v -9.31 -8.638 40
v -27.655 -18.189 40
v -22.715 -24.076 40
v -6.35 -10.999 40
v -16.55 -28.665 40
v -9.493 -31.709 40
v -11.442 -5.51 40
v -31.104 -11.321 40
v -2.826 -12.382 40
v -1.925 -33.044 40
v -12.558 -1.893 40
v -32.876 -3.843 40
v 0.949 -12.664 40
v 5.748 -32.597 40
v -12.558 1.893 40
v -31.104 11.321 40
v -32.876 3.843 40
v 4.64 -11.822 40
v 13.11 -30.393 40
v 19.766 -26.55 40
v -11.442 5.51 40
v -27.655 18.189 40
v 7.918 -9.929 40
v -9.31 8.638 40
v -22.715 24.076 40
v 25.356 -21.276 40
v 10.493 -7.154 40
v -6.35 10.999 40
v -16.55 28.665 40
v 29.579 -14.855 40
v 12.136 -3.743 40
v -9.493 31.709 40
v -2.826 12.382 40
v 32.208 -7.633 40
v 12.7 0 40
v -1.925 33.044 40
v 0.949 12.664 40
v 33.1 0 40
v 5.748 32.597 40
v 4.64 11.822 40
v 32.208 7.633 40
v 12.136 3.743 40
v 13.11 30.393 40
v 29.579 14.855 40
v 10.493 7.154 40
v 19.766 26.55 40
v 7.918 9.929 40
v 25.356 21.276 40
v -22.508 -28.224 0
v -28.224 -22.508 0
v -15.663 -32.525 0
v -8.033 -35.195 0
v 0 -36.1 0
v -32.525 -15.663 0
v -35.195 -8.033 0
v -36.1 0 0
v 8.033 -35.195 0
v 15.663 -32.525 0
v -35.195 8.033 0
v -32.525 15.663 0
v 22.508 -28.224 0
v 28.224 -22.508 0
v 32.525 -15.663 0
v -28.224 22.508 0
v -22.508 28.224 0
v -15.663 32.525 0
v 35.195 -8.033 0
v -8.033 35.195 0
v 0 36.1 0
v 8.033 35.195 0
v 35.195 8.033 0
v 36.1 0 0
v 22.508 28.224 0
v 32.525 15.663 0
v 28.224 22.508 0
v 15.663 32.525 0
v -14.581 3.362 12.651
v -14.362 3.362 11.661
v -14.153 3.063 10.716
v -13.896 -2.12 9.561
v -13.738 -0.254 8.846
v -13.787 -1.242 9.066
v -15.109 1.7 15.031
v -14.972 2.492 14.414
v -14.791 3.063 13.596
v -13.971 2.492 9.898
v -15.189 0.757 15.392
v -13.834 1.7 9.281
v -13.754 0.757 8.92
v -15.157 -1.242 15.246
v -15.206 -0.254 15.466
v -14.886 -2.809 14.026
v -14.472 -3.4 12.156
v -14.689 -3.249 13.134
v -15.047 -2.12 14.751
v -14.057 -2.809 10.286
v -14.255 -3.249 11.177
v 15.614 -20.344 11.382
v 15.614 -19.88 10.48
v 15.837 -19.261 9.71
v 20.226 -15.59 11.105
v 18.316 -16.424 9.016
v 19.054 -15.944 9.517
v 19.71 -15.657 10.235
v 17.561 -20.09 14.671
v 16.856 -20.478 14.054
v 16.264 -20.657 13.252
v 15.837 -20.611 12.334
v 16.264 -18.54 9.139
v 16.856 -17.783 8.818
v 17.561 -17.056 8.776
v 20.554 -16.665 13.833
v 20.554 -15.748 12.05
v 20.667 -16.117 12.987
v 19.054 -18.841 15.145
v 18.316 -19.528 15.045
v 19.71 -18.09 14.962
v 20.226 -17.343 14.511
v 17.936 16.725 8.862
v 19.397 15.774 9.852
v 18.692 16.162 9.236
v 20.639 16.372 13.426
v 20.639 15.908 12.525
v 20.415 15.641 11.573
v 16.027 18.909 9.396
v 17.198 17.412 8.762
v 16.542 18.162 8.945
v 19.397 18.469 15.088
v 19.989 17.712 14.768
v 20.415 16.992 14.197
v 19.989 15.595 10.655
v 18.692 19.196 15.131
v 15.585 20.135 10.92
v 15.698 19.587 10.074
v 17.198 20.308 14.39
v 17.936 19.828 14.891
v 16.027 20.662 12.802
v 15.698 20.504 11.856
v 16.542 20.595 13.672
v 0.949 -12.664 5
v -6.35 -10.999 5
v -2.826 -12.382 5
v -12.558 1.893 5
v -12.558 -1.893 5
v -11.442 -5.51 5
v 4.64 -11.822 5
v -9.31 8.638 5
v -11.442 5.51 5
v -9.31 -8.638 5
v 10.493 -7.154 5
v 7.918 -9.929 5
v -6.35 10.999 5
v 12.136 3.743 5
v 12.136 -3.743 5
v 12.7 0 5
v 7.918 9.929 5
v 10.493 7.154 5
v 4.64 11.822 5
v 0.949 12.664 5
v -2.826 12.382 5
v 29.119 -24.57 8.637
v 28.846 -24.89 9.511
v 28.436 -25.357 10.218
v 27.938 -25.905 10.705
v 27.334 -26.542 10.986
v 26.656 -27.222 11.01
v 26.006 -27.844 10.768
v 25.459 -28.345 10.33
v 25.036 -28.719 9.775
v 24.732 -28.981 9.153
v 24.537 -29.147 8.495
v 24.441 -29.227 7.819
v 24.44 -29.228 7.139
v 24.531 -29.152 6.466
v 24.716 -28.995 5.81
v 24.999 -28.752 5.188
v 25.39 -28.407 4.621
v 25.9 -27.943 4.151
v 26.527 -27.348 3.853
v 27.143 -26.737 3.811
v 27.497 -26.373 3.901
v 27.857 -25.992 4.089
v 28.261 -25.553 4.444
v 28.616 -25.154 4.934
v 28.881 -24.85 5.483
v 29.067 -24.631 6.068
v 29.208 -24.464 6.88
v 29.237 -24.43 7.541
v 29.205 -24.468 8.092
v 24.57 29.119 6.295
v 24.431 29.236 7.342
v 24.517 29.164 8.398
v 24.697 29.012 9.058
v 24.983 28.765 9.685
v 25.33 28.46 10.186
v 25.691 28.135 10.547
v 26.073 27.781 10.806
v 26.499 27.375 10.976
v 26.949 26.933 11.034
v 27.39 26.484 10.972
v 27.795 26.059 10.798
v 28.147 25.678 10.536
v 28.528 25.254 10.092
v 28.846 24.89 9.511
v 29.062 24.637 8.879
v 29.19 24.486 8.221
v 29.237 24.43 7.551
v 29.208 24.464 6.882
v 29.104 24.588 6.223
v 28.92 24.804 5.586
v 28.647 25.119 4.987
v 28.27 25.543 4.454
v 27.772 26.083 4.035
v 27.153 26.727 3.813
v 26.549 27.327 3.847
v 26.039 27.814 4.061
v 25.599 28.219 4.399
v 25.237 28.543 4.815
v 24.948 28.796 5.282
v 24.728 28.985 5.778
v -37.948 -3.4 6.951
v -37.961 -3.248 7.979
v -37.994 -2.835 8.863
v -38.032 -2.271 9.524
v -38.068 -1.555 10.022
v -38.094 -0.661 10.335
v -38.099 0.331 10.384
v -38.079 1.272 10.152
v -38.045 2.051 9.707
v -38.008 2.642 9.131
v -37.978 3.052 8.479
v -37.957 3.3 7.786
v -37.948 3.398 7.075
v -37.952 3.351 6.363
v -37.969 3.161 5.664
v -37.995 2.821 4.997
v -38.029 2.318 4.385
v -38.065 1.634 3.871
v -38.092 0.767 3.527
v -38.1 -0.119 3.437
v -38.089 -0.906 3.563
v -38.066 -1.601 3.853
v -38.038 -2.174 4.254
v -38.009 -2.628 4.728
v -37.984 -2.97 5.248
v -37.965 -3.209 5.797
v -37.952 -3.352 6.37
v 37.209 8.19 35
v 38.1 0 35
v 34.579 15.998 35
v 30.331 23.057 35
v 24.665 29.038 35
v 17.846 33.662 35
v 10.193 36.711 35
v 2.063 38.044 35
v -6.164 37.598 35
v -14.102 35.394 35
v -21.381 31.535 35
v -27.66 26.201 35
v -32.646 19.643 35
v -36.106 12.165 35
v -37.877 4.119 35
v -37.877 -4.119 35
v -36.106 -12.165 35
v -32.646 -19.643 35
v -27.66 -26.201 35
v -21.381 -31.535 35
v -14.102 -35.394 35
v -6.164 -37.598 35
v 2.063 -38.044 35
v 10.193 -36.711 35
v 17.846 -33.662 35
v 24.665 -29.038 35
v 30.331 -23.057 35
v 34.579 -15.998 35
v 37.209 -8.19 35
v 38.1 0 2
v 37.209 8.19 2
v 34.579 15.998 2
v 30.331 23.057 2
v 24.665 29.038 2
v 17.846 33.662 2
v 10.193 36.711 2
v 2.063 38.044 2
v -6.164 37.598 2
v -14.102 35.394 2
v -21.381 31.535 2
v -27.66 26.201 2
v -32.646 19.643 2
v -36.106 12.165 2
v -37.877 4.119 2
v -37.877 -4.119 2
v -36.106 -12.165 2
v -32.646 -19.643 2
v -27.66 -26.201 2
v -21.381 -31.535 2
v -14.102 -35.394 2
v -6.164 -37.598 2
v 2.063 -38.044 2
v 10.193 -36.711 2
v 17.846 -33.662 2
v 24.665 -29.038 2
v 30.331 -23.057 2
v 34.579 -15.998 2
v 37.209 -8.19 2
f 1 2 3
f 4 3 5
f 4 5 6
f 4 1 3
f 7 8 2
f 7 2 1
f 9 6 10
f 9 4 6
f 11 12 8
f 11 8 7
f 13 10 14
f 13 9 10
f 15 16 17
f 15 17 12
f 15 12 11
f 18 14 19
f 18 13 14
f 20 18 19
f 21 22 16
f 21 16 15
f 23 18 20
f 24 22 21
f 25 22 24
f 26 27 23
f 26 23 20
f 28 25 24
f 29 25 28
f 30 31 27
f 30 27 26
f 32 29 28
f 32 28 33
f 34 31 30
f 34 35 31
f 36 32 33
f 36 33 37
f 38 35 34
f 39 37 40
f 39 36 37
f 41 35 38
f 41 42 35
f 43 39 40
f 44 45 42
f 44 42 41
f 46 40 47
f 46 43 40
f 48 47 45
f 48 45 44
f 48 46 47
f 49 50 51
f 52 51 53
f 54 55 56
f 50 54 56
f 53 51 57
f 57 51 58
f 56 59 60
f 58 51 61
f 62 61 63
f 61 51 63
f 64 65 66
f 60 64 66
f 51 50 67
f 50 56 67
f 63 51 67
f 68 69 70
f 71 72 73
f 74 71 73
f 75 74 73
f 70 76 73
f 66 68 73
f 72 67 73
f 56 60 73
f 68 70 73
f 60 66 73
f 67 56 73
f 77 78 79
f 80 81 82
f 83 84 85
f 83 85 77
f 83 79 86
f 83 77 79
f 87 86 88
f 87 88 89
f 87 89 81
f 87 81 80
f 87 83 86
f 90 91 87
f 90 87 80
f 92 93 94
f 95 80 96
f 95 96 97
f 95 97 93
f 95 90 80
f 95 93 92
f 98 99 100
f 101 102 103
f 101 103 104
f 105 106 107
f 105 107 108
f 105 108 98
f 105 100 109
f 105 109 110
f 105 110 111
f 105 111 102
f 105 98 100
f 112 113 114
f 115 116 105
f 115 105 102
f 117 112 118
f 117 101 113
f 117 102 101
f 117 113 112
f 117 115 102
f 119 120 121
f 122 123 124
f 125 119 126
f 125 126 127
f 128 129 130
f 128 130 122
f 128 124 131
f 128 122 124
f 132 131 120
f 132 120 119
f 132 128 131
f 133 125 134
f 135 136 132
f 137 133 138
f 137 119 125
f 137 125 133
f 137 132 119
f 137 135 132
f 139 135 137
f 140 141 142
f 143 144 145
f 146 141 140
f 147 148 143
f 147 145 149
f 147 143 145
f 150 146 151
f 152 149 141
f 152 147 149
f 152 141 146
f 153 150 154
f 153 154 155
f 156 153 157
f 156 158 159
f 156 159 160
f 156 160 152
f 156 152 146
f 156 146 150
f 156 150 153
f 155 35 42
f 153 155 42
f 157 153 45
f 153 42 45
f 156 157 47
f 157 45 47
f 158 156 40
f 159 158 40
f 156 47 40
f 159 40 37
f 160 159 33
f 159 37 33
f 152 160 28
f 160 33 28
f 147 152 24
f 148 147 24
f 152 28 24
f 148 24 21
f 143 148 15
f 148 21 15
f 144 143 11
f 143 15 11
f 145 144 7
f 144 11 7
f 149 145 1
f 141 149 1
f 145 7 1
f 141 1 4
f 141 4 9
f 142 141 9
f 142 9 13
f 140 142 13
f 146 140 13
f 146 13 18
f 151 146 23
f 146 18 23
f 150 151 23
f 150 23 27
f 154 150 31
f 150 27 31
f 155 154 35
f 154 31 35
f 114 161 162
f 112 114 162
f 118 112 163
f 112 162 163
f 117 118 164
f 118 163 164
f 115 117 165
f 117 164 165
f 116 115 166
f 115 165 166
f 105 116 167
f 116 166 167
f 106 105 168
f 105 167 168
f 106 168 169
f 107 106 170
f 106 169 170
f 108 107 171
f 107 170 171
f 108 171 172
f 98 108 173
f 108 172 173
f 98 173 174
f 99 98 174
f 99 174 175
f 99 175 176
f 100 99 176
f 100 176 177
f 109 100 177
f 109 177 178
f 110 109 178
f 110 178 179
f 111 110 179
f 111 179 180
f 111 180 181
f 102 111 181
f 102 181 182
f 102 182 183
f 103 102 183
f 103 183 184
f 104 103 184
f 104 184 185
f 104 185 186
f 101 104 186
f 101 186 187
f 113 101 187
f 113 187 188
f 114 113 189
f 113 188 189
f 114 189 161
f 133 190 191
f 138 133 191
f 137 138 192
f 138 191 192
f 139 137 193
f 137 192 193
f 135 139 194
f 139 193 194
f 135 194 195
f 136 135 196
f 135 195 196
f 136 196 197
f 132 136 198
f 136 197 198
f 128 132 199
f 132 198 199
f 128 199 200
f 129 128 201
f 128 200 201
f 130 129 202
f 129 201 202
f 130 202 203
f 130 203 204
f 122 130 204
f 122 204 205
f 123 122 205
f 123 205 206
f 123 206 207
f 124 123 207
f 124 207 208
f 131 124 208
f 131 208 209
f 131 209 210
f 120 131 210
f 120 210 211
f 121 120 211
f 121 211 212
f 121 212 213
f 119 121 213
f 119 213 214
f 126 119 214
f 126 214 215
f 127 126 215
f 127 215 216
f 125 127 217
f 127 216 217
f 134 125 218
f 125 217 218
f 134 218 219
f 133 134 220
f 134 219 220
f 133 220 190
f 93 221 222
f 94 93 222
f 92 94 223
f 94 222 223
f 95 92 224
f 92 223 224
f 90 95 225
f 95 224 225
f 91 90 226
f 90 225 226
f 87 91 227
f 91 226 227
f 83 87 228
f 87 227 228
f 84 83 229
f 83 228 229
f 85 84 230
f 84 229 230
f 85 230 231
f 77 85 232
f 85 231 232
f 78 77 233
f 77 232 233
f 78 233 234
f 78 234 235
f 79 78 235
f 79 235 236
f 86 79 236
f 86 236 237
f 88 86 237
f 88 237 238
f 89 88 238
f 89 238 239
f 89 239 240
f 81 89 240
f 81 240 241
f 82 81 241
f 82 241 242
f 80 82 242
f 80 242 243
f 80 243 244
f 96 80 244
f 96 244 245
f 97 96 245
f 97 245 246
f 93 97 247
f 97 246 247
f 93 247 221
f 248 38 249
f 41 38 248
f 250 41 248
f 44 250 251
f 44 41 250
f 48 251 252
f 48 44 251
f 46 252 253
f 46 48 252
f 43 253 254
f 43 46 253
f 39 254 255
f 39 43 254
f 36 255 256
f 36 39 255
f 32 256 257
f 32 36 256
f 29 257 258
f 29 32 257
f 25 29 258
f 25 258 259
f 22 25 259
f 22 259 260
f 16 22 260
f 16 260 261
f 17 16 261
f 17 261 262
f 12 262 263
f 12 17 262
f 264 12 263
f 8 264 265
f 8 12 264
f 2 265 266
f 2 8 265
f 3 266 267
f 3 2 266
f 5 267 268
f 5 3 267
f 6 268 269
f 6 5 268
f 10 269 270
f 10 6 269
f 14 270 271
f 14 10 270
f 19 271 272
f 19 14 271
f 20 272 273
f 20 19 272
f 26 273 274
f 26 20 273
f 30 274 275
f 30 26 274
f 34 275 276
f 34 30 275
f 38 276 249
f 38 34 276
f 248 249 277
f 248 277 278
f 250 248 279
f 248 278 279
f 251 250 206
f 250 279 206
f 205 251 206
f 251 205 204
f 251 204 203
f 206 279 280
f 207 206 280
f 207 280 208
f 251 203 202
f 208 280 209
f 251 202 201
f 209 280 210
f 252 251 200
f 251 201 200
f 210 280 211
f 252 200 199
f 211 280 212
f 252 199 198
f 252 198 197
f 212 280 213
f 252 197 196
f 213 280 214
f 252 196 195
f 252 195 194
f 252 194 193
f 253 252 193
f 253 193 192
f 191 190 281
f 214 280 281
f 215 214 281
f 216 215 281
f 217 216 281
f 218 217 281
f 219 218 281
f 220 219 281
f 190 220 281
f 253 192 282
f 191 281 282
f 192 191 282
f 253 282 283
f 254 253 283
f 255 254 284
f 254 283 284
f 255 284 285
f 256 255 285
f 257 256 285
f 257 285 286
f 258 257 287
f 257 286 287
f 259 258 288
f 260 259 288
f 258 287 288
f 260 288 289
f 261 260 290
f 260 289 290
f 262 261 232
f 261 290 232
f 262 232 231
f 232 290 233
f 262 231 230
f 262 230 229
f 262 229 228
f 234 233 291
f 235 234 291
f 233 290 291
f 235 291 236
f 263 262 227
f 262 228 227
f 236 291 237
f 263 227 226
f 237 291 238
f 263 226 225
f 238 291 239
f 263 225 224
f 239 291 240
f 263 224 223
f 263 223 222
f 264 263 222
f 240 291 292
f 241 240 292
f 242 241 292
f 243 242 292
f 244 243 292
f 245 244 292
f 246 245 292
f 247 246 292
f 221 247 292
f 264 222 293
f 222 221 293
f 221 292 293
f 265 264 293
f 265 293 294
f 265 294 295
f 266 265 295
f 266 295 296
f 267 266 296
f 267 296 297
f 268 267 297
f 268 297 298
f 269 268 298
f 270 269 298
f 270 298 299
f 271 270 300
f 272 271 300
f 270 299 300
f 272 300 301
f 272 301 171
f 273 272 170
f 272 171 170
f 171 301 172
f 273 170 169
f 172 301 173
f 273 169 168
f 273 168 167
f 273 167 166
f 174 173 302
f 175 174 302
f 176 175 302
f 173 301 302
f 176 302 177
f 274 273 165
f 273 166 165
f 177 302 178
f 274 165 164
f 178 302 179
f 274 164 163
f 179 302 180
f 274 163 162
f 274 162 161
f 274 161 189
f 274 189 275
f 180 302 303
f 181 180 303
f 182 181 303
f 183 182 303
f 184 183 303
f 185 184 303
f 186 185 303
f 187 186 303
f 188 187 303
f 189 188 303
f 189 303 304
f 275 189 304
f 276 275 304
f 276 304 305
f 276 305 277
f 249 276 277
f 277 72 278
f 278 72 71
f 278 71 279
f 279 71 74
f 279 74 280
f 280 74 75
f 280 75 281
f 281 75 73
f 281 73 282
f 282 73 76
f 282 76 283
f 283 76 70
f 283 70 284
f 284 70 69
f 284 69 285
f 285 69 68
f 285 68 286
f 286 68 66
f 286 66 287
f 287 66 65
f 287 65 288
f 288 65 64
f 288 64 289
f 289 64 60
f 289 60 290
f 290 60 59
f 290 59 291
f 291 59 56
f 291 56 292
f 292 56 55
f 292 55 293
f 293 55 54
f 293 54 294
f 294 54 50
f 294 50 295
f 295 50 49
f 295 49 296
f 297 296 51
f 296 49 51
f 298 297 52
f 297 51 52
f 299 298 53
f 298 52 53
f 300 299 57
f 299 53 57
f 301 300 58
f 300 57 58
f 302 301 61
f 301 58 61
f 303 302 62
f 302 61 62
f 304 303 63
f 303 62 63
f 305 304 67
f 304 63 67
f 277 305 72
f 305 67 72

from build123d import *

# Parameters (mm, degrees)
F0_R      = 38.1
F1_DEPTH  = 40
F2_R      = 12.7
F3_DEPTH  = 35
F4_SIZE   = 5
F11_R     = 3.4
F12_DEPTH = 50
F15_SIZE  = 2
F16_R     = 3.4
F17_DEPTH = 50
F18_R     = 3.4
F19_DEPTH = 50


with BuildPart() as f1:
    # F0 (on Top) → F1 (new body)
    with BuildSketch(Plane.XY):
        Circle(F0_R)
    extrude(amount=F1_DEPTH)

    # F2 (on face) → F3 (cut)
    with BuildSketch(Plane.XY.offset(40)):
        Circle(F2_R)
    extrude(amount=-F3_DEPTH, mode=Mode.SUBTRACT)

    # F4
    f4_edges = [f1.edges().sort_by_distance(p)[0] for p in [
        (-38.1, 0, 40),
    ]]
    chamfer(f4_edges, length=F4_SIZE)

    # F11 (on face) → F12 (cut)
    with BuildSketch(Plane(origin=(46.512412, -46.512412, -23.94141), x_dir=(0.747321, 0.590792, 0.304099), z_dir=(0.664463, -0.664463, -0.34202))):
        with Locations((6.472312, 18.923773)):
            Circle(F11_R)
    extrude(amount=-F12_DEPTH, mode=Mode.SUBTRACT)

    # F15
    f15_edges = [f1.edges().sort_by_distance(p)[0] for p in [
        (-38.1, 0, 0),
    ]]
    chamfer(f15_edges, length=F15_SIZE)

    # F16 (on face) → F17 (cut)
    with BuildSketch(Plane(origin=(46.512412, 46.512412, -23.94141), x_dir=(-0.747321, 0.590792, -0.304099), z_dir=(0.664463, 0.664463, -0.34202))):
        with Locations((-6.472312, 18.923773)):
            Circle(F16_R)
    extrude(amount=-F17_DEPTH, mode=Mode.SUBTRACT)

    # F18 (on face) → F19 (cut)
    with BuildSketch(Plane(origin=(-60.04, 0, -13.310548), x_dir=(0, -1, 0), z_dir=(-0.976296, 0, -0.21644))):
        with Locations((0, 15)):
            Circle(F18_R)
    extrude(amount=-F19_DEPTH, mode=Mode.SUBTRACT)


solid = f1.part
